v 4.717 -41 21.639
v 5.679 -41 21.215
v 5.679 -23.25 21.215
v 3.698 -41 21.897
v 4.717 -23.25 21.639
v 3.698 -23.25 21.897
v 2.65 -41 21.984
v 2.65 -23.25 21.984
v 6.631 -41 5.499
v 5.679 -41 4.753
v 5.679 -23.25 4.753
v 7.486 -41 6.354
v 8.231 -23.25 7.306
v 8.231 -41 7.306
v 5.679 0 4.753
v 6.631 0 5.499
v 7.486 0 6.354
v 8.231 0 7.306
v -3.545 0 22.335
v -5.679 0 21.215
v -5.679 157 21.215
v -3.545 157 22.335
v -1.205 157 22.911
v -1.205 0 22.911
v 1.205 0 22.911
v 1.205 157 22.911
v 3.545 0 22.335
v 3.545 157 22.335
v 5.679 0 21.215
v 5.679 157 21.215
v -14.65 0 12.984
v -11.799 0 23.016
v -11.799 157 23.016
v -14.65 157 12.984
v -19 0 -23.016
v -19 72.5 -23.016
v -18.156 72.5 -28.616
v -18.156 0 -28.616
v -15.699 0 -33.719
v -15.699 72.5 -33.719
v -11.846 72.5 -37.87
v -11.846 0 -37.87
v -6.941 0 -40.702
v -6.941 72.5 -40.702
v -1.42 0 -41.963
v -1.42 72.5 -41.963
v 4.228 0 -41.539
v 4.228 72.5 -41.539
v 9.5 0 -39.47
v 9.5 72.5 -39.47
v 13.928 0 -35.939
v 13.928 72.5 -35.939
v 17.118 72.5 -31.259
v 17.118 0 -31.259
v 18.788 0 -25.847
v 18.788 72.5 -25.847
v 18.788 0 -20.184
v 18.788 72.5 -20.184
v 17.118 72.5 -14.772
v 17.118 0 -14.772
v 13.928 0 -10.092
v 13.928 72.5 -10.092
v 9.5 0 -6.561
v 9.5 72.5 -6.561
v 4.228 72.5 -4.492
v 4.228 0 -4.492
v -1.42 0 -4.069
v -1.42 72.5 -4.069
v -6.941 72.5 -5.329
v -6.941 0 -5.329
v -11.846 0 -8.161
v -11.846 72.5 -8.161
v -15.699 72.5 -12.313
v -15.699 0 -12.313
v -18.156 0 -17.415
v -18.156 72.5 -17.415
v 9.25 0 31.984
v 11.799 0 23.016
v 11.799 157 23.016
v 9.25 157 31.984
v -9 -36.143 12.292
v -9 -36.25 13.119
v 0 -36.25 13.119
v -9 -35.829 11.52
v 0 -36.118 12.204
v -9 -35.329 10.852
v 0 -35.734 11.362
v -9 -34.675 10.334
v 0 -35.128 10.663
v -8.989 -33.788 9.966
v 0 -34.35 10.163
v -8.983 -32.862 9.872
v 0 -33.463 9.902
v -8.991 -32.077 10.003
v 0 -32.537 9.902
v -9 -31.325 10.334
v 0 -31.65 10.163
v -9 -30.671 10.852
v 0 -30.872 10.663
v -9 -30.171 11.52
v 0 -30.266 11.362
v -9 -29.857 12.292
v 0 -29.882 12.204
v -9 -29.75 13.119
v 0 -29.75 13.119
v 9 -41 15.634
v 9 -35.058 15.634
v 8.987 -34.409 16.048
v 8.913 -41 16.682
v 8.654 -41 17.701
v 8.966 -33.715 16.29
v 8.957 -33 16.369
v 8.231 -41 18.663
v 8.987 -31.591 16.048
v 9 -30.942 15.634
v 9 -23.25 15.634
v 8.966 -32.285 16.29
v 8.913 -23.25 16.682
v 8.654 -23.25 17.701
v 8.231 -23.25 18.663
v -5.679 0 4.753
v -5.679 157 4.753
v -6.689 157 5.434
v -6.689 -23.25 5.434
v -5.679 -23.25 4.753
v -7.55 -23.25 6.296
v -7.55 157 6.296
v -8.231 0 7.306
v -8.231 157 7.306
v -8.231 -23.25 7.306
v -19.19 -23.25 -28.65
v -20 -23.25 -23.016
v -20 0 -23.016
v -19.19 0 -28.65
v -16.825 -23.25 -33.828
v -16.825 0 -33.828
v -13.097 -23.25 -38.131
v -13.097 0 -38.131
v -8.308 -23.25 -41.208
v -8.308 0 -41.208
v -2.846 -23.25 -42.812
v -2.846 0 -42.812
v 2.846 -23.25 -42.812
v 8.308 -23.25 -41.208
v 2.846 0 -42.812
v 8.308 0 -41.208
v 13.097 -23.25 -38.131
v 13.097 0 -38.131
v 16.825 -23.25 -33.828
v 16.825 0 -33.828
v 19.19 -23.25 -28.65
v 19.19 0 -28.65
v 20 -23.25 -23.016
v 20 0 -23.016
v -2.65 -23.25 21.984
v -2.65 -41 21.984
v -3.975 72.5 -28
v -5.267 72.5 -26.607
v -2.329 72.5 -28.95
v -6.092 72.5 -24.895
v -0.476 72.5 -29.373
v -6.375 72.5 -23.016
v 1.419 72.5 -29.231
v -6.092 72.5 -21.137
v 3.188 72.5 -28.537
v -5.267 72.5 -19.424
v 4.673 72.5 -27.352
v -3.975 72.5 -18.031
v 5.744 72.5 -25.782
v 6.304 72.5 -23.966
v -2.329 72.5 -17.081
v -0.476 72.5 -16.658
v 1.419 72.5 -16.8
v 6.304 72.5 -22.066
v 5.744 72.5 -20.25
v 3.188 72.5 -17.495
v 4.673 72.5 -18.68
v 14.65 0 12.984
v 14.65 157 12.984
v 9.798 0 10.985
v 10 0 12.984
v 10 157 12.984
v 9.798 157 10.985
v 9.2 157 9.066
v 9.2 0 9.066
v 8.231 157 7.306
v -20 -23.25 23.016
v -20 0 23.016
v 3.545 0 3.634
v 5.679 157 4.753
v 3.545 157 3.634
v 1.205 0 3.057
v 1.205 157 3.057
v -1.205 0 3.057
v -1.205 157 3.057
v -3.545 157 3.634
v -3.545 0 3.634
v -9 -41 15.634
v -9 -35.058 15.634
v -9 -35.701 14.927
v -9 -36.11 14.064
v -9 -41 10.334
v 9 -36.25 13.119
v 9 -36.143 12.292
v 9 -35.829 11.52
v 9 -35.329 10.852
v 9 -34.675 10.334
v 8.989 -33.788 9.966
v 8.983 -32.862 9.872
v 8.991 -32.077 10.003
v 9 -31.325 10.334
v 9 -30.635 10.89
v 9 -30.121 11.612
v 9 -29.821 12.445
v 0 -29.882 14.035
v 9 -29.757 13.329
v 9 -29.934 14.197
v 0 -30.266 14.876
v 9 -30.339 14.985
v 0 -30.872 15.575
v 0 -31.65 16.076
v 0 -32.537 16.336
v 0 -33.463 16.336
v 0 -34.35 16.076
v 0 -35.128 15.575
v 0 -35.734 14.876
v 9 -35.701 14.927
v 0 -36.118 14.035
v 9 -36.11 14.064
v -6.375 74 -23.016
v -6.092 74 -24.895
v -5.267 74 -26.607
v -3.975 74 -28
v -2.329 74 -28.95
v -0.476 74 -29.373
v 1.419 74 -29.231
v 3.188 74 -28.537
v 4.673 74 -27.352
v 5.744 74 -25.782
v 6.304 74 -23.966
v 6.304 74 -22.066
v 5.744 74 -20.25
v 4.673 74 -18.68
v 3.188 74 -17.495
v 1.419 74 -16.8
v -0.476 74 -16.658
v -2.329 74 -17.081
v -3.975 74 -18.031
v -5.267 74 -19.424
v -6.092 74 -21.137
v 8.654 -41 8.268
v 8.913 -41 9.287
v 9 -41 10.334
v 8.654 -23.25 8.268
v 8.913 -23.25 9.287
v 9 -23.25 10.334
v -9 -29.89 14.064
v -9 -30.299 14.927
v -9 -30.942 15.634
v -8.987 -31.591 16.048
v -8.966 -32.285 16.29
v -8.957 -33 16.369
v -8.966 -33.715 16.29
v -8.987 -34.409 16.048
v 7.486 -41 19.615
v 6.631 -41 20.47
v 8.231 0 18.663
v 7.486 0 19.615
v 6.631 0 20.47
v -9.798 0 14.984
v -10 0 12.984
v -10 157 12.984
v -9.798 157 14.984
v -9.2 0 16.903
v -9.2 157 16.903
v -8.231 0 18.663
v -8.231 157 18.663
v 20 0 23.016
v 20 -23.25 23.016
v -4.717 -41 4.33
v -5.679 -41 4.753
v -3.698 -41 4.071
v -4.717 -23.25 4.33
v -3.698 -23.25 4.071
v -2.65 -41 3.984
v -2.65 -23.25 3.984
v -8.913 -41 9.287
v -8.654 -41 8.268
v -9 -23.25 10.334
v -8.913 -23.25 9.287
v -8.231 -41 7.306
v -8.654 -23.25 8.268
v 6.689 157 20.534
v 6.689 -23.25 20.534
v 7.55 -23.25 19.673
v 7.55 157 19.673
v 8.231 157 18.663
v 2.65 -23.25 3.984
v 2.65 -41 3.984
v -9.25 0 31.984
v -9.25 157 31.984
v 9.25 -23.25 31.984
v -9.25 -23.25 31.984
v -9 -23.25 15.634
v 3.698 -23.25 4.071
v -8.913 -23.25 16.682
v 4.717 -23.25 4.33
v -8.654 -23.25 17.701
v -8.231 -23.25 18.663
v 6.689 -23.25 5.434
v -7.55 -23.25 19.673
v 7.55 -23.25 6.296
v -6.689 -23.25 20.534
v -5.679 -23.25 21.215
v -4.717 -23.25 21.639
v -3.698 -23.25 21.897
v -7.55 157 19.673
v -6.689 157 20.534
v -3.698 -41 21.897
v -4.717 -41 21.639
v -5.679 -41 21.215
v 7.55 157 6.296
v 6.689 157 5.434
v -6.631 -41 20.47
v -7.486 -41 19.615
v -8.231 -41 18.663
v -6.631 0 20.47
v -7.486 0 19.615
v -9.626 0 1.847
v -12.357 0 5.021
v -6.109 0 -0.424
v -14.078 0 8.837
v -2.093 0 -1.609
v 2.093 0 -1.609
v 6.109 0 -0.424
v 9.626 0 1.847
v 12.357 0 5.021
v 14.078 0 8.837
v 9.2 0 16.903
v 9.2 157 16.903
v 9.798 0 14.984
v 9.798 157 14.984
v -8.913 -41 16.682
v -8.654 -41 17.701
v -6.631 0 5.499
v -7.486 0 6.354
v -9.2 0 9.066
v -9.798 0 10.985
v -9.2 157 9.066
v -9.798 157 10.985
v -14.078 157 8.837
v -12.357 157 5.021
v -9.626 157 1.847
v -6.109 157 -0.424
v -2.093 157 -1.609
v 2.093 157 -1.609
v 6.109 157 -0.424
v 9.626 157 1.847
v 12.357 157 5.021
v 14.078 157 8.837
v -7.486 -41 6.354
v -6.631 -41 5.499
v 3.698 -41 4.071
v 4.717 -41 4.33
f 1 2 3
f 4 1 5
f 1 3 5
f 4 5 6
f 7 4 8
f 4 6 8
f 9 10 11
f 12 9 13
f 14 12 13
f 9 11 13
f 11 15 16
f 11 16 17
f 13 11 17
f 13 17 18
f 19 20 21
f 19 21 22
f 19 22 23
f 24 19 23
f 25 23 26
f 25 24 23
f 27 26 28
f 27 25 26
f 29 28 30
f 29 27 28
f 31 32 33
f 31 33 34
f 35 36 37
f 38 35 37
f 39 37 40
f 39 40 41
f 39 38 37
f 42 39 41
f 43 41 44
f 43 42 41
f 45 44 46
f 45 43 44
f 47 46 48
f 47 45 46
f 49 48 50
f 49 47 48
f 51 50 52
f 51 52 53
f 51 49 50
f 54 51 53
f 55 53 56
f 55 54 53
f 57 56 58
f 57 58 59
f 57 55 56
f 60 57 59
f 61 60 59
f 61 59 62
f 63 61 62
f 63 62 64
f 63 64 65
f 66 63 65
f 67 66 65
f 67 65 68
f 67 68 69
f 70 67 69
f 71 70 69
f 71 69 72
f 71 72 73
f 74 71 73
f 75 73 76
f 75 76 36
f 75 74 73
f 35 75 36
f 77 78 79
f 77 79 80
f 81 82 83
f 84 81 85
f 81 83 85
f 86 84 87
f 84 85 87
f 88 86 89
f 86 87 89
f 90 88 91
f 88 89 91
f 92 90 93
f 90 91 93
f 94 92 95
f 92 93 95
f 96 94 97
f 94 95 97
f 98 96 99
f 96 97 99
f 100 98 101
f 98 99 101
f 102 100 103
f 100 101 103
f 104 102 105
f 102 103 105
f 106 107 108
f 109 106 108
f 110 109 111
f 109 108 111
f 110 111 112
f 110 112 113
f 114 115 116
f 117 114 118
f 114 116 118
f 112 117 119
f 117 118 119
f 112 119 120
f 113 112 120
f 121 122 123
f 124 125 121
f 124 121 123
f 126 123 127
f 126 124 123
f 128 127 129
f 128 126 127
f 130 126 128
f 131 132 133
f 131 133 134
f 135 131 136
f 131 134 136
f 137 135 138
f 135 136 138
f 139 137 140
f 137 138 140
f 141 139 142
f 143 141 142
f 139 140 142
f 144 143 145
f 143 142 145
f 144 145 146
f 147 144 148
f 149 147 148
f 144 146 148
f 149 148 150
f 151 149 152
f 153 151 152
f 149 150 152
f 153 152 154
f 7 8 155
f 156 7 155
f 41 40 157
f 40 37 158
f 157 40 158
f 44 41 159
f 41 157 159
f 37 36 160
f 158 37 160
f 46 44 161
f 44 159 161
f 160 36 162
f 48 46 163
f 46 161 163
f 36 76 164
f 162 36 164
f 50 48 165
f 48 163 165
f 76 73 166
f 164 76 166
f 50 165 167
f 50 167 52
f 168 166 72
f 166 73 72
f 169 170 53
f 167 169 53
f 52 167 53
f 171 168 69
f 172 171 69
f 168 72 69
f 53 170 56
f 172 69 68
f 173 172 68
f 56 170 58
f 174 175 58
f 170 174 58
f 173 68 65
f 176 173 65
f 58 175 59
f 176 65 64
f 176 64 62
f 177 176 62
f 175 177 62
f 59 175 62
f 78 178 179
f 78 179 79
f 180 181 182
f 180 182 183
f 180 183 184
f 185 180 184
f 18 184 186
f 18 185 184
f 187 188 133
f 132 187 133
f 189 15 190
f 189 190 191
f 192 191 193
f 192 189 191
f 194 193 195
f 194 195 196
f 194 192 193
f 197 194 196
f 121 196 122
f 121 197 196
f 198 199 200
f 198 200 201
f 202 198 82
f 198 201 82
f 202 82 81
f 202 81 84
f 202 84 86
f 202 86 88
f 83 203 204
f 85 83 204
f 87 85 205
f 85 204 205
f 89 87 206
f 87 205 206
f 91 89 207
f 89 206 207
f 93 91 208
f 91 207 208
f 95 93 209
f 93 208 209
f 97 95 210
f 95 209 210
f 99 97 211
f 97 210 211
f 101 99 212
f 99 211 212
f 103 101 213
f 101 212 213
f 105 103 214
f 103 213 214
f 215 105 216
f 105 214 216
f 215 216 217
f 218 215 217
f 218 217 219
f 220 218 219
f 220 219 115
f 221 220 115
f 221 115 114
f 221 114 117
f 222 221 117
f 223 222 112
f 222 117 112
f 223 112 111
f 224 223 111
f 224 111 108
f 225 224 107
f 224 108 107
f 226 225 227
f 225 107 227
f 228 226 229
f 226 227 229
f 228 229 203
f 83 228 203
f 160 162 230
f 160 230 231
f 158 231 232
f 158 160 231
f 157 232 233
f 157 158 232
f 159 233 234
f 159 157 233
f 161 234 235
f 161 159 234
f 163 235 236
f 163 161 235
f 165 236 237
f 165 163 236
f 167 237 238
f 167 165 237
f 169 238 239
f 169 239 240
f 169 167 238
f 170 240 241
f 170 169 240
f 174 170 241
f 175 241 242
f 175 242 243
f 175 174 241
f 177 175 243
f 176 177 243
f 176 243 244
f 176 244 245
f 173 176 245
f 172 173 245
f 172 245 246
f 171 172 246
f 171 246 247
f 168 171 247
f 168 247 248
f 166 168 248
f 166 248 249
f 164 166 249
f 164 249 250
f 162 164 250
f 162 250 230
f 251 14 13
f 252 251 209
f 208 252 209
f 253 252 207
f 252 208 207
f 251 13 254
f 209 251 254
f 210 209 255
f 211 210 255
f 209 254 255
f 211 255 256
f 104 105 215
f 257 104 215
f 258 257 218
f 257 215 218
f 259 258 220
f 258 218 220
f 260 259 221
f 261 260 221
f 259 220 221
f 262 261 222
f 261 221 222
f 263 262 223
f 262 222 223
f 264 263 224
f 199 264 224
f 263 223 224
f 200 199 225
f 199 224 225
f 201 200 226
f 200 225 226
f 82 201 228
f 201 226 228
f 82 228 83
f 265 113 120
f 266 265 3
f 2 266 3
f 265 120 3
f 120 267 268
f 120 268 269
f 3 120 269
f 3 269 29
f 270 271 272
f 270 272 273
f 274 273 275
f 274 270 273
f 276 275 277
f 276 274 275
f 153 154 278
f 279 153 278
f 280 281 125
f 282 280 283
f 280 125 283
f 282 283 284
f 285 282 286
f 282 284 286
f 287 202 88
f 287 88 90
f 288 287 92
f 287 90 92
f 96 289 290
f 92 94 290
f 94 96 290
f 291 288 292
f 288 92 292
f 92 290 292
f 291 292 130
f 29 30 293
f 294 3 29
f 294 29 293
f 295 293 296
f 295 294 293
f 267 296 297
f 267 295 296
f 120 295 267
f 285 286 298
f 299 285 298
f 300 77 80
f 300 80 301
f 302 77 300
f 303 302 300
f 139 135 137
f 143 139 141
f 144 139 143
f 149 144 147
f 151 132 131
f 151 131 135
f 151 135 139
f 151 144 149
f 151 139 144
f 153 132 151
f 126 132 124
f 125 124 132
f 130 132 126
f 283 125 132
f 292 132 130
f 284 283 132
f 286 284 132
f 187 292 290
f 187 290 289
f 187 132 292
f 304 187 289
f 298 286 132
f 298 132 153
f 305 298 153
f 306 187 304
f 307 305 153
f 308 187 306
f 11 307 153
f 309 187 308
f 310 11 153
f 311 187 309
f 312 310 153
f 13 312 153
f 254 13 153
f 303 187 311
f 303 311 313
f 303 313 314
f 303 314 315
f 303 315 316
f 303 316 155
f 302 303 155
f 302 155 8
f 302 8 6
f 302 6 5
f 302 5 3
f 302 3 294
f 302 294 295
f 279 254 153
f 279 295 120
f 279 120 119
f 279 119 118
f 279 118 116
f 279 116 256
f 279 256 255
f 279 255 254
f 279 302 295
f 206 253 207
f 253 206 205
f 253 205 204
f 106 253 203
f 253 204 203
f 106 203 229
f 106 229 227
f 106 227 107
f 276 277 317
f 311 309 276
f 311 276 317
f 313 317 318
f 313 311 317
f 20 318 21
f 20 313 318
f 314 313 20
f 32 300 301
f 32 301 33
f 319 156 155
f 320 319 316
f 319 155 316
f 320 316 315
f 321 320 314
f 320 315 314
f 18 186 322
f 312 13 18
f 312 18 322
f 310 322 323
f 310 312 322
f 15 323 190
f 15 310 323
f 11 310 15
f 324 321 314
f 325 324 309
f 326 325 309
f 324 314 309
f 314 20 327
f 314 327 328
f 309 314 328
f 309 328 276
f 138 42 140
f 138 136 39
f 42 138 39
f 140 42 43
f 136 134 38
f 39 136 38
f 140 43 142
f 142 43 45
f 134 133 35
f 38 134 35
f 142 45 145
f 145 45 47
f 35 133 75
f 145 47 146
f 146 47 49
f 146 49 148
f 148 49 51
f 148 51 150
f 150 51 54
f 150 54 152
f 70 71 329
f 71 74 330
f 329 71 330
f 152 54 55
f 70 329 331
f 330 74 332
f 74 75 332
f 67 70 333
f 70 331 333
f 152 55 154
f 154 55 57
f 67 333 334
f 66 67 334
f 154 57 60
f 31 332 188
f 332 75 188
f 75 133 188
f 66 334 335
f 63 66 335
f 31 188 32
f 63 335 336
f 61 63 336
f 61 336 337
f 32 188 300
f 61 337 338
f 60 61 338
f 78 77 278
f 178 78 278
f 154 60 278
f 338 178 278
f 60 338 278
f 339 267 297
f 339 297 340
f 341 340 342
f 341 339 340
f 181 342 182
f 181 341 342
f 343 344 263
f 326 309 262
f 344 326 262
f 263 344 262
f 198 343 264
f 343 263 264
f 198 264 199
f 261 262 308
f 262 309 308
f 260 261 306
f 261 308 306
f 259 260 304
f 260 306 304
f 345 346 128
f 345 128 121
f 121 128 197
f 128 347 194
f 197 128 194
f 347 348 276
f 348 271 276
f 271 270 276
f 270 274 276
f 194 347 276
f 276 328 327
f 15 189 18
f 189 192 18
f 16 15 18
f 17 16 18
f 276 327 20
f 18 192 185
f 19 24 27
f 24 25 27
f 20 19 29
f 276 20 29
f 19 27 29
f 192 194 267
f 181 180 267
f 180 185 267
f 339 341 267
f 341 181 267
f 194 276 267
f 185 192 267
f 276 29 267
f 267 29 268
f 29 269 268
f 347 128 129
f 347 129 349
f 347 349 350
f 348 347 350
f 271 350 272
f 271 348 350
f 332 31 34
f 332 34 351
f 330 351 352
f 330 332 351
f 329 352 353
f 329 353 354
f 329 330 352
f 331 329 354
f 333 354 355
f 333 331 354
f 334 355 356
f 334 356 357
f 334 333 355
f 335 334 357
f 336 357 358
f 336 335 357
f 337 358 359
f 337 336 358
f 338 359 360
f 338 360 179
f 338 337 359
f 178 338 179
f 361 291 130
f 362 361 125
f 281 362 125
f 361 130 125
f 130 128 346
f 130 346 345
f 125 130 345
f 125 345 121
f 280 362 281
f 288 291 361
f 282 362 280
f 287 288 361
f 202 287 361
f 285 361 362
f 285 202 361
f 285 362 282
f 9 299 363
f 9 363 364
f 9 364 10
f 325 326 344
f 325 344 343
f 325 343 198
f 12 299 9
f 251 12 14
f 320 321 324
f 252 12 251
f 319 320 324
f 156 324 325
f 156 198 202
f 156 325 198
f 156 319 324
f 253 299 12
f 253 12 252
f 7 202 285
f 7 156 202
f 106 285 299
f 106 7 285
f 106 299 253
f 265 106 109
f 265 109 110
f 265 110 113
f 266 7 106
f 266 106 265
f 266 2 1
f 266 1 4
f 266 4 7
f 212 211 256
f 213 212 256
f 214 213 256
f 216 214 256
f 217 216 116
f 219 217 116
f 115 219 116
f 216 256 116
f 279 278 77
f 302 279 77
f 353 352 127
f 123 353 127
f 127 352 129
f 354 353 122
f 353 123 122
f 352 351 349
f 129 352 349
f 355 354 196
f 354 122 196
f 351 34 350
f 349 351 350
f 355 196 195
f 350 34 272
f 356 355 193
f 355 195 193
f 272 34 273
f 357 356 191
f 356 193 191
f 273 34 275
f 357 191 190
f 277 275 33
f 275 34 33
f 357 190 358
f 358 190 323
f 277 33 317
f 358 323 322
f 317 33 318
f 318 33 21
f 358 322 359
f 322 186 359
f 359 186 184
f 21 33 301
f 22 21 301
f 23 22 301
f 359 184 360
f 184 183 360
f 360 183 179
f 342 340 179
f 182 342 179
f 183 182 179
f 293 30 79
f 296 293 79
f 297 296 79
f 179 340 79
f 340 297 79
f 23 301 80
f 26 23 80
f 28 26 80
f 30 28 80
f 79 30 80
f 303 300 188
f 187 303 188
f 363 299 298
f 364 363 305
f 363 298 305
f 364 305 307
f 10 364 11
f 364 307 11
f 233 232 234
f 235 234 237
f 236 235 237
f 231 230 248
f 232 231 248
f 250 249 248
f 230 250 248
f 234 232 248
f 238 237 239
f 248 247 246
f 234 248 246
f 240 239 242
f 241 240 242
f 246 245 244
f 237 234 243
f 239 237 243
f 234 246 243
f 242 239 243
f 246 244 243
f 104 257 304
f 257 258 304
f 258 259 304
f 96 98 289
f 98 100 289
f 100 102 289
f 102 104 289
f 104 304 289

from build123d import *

# Parameters (mm, degrees)
F2_DEPTH = 23.25
F3_DEPTH = 41
F4_DEPTH = 72.5
F5_DEPTH = 74
F6_DEPTH = 157
F7_D     = 6.5
F7_DEPTH = 20.001
F8_D     = 6.5


with BuildPart() as f2:
    # F0 (on Front) → F2 (new body)
    with BuildSketch(Plane.XZ):
        Polygon((-9.25, 31.9843477787), (-20, 23.0156522213), (-11.7989976847, 23.0156522213), align=None)
        with BuildLine():
            Line((-11.7989976847, 23.0156522213), (-20, 23.0156522213))
            Line((-20, 23.0156522213), (-20, -23.0156522213))
            Line((-20, -23.0156522213), (-19, -23.0156522213))
            ThreePointArc((-19, -23.0156522213), (0, -4.0156522213), (19, -23.0156522213))
            Line((19, -23.0156522213), (20, -23.0156522213))
            Line((20, -23.0156522213), (20, 23.0156522213))
            Line((20, 23.0156522213), (11.7989976847, 23.0156522213))
            Line((11.7989976847, 23.0156522213), (14.65, 12.9843477787))
            ThreePointArc((14.65, 12.9843477787), (0, -1.7589444033), (-14.65, 12.9843477787))
            Line((-14.65, 12.9843477787), (-11.7989976847, 23.0156522213))
        make_face()
        Polygon((-9.25, 31.9843477787), (-11.7989976847, 23.0156522213), (11.7989976847, 23.0156522213), (9.25, 31.9843477787), align=None)
        with BuildLine():
            Line((-19, -23.0156522213), (-20, -23.0156522213))
            ThreePointArc((-20, -23.0156522213), (0, -43.0156522213), (20, -23.0156522213))
            Line((20, -23.0156522213), (19, -23.0156522213))
            ThreePointArc((19, -23.0156522213), (0, -42.0156522213), (-19, -23.0156522213))
        make_face()
        Polygon((9.25, 31.9843477787), (11.7989976847, 23.0156522213), (20, 23.0156522213), align=None)
        with BuildLine():
            Line((-10, 12.9843477787), (-14.65, 12.9843477787))
            ThreePointArc((-14.65, 12.9843477787), (0, -1.7589444033), (14.65, 12.9843477787))
            Line((14.65, 12.9843477787), (10, 12.9843477787))
            ThreePointArc((10, 12.9843477787), (9.5475471091, 10.0104035628), (8.2311311601, 7.3055732784))
            ThreePointArc((8.2311311601, 7.3055732784), (7.1401280605, 5.8442197181), (5.6787745002, 4.7532166185))
            ThreePointArc((5.6787745002, 4.7532166185), (0, 2.9843477787), (-5.6787745002, 4.7532166185))
            ThreePointArc((-5.6787745002, 4.7532166185), (-7.1401280605, 5.8442197181), (-8.2311311601, 7.3055732784))
            ThreePointArc((-8.2311311601, 7.3055732784), (-9.5475471091, 10.0104035628), (-10, 12.9843477787))
        make_face()
        with BuildLine():
            Line((11.7989976847, 23.0156522213), (-11.7989976847, 23.0156522213))
            Line((-11.7989976847, 23.0156522213), (-14.65, 12.9843477787))
            Line((-14.65, 12.9843477787), (-10, 12.9843477787))
            ThreePointArc((-10, 12.9843477787), (-9.5475471091, 15.9582919946), (-8.2311311601, 18.6631222789))
            ThreePointArc((-8.2311311601, 18.6631222789), (-7.1401280605, 20.1244758392), (-5.6787745002, 21.2154789388))
            ThreePointArc((-5.6787745002, 21.2154789388), (0, 22.9843477787), (5.6787745002, 21.2154789388))
            ThreePointArc((5.6787745002, 21.2154789388), (7.1401280605, 20.1244758392), (8.2311311601, 18.6631222789))
            ThreePointArc((8.2311311601, 18.6631222789), (9.5475471091, 15.9582919946), (10, 12.9843477787))
            Line((10, 12.9843477787), (14.65, 12.9843477787))
            Line((14.65, 12.9843477787), (11.7989976847, 23.0156522213))
        make_face()
        with BuildLine():
            ThreePointArc((5.6787745002, 21.2154789388), (0, 22.9843477787), (-5.6787745002, 21.2154789388))
            ThreePointArc((-5.6787745002, 21.2154789388), (-4.2124207393, 21.7891297759), (-2.65, 21.9843477787))
            Line((-2.65, 21.9843477787), (2.65, 21.9843477787))
            ThreePointArc((2.65, 21.9843477787), (4.2124207393, 21.7891297759), (5.6787745002, 21.2154789388))
        make_face()
        with BuildLine():
            ThreePointArc((-8.2311311601, 18.6631222789), (-9.5475471091, 15.9582919946), (-10, 12.9843477787))
            Line((-10, 12.9843477787), (-9, 12.9843477787))
            Line((-9, 12.9843477787), (-9, 15.6343477787))
            ThreePointArc((-9, 15.6343477787), (-8.8047819972, 17.1967685179), (-8.2311311601, 18.6631222789))
        make_face()
        with BuildLine():
            Line((-9, 12.9843477787), (-10, 12.9843477787))
            ThreePointArc((-10, 12.9843477787), (-9.5475471091, 10.0104035628), (-8.2311311601, 7.3055732784))
            ThreePointArc((-8.2311311601, 7.3055732784), (-8.8047819972, 8.7719270394), (-9, 10.3343477787))
            Line((-9, 10.3343477787), (-9, 12.9843477787))
        make_face()
        with BuildLine():
            ThreePointArc((8.2311311601, 7.3055732784), (9.5475471091, 10.0104035628), (10, 12.9843477787))
            Line((10, 12.9843477787), (9, 12.9843477787))
            Line((9, 12.9843477787), (9, 10.3343477787))
            ThreePointArc((9, 10.3343477787), (8.8047819972, 8.7719270394), (8.2311311601, 7.3055732784))
        make_face()
        with BuildLine():
            Line((9, 12.9843477787), (10, 12.9843477787))
            ThreePointArc((10, 12.9843477787), (9.5475471091, 15.9582919946), (8.2311311601, 18.6631222789))
            ThreePointArc((8.2311311601, 18.6631222789), (8.8047819972, 17.1967685179), (9, 15.6343477787))
            Line((9, 15.6343477787), (9, 12.9843477787))
        make_face()
        with BuildLine():
            ThreePointArc((-2.65, 3.9843477787), (-4.2124207393, 4.1795657814), (-5.6787745002, 4.7532166185))
            ThreePointArc((-5.6787745002, 4.7532166185), (0, 2.9843477787), (5.6787745002, 4.7532166185))
            ThreePointArc((5.6787745002, 4.7532166185), (4.2124207393, 4.1795657814), (2.65, 3.9843477787))
            Line((2.65, 3.9843477787), (-2.65, 3.9843477787))
        make_face()
        with BuildLine():
            ThreePointArc((19, -23.0156522213), (0, -4.0156522213), (-19, -23.0156522213))
            Line((-19, -23.0156522213), (-6.375, -23.0156522213))
            ThreePointArc((-6.375, -23.0156522213), (0, -16.6406522213), (6.375, -23.0156522213))
            Line((6.375, -23.0156522213), (19, -23.0156522213))
        make_face()
        with BuildLine():
            ThreePointArc((6.375, -23.0156522213), (0, -16.6406522213), (-6.375, -23.0156522213))
            Line((-6.375, -23.0156522213), (6.375, -23.0156522213))
        make_face()
        with BuildLine():
            Line((6.375, -23.0156522213), (-6.375, -23.0156522213))
            ThreePointArc((-6.375, -23.0156522213), (0, -29.3906522213), (6.375, -23.0156522213))
        make_face()
        with BuildLine():
            Line((-6.375, -23.0156522213), (-19, -23.0156522213))
            ThreePointArc((-19, -23.0156522213), (0, -42.0156522213), (19, -23.0156522213))
            Line((19, -23.0156522213), (6.375, -23.0156522213))
            ThreePointArc((6.375, -23.0156522213), (0, -29.3906522213), (-6.375, -23.0156522213))
        make_face()
    extrude(amount=F2_DEPTH)

    # F0 (on Front) → F3 (join)
    with BuildSketch(Plane.XZ):
        with BuildLine():
            ThreePointArc((-5.6787745002, 21.2154789388), (-7.0710678119, 20.0554155905), (-8.2311311601, 18.6631222789))
            ThreePointArc((-8.2311311601, 18.6631222789), (-8.8047819972, 17.1967685179), (-9, 15.6343477787))
            Line((-9, 15.6343477787), (-9, 12.9843477787))
            Line((-9, 12.9843477787), (0, 12.9843477787))
            Line((0, 12.9843477787), (9, 12.9843477787))
            Line((9, 12.9843477787), (9, 15.6343477787))
            ThreePointArc((9, 15.6343477787), (8.8047819972, 17.1967685179), (8.2311311601, 18.6631222789))
            ThreePointArc((8.2311311601, 18.6631222789), (7.0710678119, 20.0554155905), (5.6787745002, 21.2154789388))
            ThreePointArc((5.6787745002, 21.2154789388), (4.2124207393, 21.7891297759), (2.65, 21.9843477787))
            Line((2.65, 21.9843477787), (-2.65, 21.9843477787))
            ThreePointArc((-2.65, 21.9843477787), (-4.2124207393, 21.7891297759), (-5.6787745002, 21.2154789388))
        make_face()
        with BuildLine():
            ThreePointArc((-9, 10.3343477787), (-8.8047819972, 8.7719270394), (-8.2311311601, 7.3055732784))
            ThreePointArc((-8.2311311601, 7.3055732784), (-7.0710678119, 5.9132799668), (-5.6787745002, 4.7532166185))
            ThreePointArc((-5.6787745002, 4.7532166185), (-4.2124207393, 4.1795657814), (-2.65, 3.9843477787))
            Line((-2.65, 3.9843477787), (2.65, 3.9843477787))
            ThreePointArc((2.65, 3.9843477787), (4.2124207393, 4.1795657814), (5.6787745002, 4.7532166185))
            ThreePointArc((5.6787745002, 4.7532166185), (7.0710678119, 5.9132799668), (8.2311311601, 7.3055732784))
            ThreePointArc((8.2311311601, 7.3055732784), (8.8047819972, 8.7719270394), (9, 10.3343477787))
            Line((9, 10.3343477787), (9, 12.9843477787))
            Line((9, 12.9843477787), (0, 12.9843477787))
            Line((0, 12.9843477787), (-9, 12.9843477787))
            Line((-9, 12.9843477787), (-9, 10.3343477787))
        make_face()
    extrude(amount=F3_DEPTH)

    # F0 (on Front) → F4 (join)
    with BuildSketch(Plane.XZ):
        with BuildLine():
            ThreePointArc((19, -23.0156522213), (0, -4.0156522213), (-19, -23.0156522213))
            Line((-19, -23.0156522213), (-6.375, -23.0156522213))
            ThreePointArc((-6.375, -23.0156522213), (0, -16.6406522213), (6.375, -23.0156522213))
            Line((6.375, -23.0156522213), (19, -23.0156522213))
        make_face()
        with BuildLine():
            Line((-6.375, -23.0156522213), (-19, -23.0156522213))
            ThreePointArc((-19, -23.0156522213), (0, -42.0156522213), (19, -23.0156522213))
            Line((19, -23.0156522213), (6.375, -23.0156522213))
            ThreePointArc((6.375, -23.0156522213), (0, -29.3906522213), (-6.375, -23.0156522213))
        make_face()
    extrude(amount=-F4_DEPTH)

    # F0 (on Front) → F5 (join)
    with BuildSketch(Plane.XZ):
        with BuildLine():
            ThreePointArc((6.375, -23.0156522213), (0, -16.6406522213), (-6.375, -23.0156522213))
            Line((-6.375, -23.0156522213), (6.375, -23.0156522213))
        make_face()
        with BuildLine():
            Line((6.375, -23.0156522213), (-6.375, -23.0156522213))
            ThreePointArc((-6.375, -23.0156522213), (0, -29.3906522213), (6.375, -23.0156522213))
        make_face()
    extrude(amount=-F5_DEPTH)

    # F0 (on Front) → F6 (join)
    with BuildSketch(Plane.XZ):
        Polygon((-9.25, 31.9843477787), (-11.7989976847, 23.0156522213), (11.7989976847, 23.0156522213), (9.25, 31.9843477787), align=None)
        with BuildLine():
            Line((11.7989976847, 23.0156522213), (-11.7989976847, 23.0156522213))
            Line((-11.7989976847, 23.0156522213), (-14.65, 12.9843477787))
            Line((-14.65, 12.9843477787), (-10, 12.9843477787))
            ThreePointArc((-10, 12.9843477787), (-9.5475471091, 15.9582919946), (-8.2311311601, 18.6631222789))
            ThreePointArc((-8.2311311601, 18.6631222789), (-7.1401280605, 20.1244758392), (-5.6787745002, 21.2154789388))
            ThreePointArc((-5.6787745002, 21.2154789388), (0, 22.9843477787), (5.6787745002, 21.2154789388))
            ThreePointArc((5.6787745002, 21.2154789388), (7.1401280605, 20.1244758392), (8.2311311601, 18.6631222789))
            ThreePointArc((8.2311311601, 18.6631222789), (9.5475471091, 15.9582919946), (10, 12.9843477787))
            Line((10, 12.9843477787), (14.65, 12.9843477787))
            Line((14.65, 12.9843477787), (11.7989976847, 23.0156522213))
        make_face()
        with BuildLine():
            Line((-10, 12.9843477787), (-14.65, 12.9843477787))
            ThreePointArc((-14.65, 12.9843477787), (0, -1.7589444033), (14.65, 12.9843477787))
            Line((14.65, 12.9843477787), (10, 12.9843477787))
            ThreePointArc((10, 12.9843477787), (9.5475471091, 10.0104035628), (8.2311311601, 7.3055732784))
            ThreePointArc((8.2311311601, 7.3055732784), (7.1401280605, 5.8442197181), (5.6787745002, 4.7532166185))
            ThreePointArc((5.6787745002, 4.7532166185), (0, 2.9843477787), (-5.6787745002, 4.7532166185))
            ThreePointArc((-5.6787745002, 4.7532166185), (-7.1401280605, 5.8442197181), (-8.2311311601, 7.3055732784))
            ThreePointArc((-8.2311311601, 7.3055732784), (-9.5475471091, 10.0104035628), (-10, 12.9843477787))
        make_face()
    extrude(amount=-F6_DEPTH)

    # F7 (through all, one way)
    with BuildSketch(Plane.YZ):
        with Locations((-33, 13.1192486733)):
            Circle(F7_D / 2)
    extrude(amount=-F7_DEPTH, mode=Mode.SUBTRACT)

    # F8 (through all)
    with Locations(Plane(origin=(0, 0, 0), x_dir=(0, 1, 0), z_dir=(-1, 0, 0))):
        with Locations((-33, -13.1192486733)):
            Hole(F8_D / 2)


solid = f2.part
